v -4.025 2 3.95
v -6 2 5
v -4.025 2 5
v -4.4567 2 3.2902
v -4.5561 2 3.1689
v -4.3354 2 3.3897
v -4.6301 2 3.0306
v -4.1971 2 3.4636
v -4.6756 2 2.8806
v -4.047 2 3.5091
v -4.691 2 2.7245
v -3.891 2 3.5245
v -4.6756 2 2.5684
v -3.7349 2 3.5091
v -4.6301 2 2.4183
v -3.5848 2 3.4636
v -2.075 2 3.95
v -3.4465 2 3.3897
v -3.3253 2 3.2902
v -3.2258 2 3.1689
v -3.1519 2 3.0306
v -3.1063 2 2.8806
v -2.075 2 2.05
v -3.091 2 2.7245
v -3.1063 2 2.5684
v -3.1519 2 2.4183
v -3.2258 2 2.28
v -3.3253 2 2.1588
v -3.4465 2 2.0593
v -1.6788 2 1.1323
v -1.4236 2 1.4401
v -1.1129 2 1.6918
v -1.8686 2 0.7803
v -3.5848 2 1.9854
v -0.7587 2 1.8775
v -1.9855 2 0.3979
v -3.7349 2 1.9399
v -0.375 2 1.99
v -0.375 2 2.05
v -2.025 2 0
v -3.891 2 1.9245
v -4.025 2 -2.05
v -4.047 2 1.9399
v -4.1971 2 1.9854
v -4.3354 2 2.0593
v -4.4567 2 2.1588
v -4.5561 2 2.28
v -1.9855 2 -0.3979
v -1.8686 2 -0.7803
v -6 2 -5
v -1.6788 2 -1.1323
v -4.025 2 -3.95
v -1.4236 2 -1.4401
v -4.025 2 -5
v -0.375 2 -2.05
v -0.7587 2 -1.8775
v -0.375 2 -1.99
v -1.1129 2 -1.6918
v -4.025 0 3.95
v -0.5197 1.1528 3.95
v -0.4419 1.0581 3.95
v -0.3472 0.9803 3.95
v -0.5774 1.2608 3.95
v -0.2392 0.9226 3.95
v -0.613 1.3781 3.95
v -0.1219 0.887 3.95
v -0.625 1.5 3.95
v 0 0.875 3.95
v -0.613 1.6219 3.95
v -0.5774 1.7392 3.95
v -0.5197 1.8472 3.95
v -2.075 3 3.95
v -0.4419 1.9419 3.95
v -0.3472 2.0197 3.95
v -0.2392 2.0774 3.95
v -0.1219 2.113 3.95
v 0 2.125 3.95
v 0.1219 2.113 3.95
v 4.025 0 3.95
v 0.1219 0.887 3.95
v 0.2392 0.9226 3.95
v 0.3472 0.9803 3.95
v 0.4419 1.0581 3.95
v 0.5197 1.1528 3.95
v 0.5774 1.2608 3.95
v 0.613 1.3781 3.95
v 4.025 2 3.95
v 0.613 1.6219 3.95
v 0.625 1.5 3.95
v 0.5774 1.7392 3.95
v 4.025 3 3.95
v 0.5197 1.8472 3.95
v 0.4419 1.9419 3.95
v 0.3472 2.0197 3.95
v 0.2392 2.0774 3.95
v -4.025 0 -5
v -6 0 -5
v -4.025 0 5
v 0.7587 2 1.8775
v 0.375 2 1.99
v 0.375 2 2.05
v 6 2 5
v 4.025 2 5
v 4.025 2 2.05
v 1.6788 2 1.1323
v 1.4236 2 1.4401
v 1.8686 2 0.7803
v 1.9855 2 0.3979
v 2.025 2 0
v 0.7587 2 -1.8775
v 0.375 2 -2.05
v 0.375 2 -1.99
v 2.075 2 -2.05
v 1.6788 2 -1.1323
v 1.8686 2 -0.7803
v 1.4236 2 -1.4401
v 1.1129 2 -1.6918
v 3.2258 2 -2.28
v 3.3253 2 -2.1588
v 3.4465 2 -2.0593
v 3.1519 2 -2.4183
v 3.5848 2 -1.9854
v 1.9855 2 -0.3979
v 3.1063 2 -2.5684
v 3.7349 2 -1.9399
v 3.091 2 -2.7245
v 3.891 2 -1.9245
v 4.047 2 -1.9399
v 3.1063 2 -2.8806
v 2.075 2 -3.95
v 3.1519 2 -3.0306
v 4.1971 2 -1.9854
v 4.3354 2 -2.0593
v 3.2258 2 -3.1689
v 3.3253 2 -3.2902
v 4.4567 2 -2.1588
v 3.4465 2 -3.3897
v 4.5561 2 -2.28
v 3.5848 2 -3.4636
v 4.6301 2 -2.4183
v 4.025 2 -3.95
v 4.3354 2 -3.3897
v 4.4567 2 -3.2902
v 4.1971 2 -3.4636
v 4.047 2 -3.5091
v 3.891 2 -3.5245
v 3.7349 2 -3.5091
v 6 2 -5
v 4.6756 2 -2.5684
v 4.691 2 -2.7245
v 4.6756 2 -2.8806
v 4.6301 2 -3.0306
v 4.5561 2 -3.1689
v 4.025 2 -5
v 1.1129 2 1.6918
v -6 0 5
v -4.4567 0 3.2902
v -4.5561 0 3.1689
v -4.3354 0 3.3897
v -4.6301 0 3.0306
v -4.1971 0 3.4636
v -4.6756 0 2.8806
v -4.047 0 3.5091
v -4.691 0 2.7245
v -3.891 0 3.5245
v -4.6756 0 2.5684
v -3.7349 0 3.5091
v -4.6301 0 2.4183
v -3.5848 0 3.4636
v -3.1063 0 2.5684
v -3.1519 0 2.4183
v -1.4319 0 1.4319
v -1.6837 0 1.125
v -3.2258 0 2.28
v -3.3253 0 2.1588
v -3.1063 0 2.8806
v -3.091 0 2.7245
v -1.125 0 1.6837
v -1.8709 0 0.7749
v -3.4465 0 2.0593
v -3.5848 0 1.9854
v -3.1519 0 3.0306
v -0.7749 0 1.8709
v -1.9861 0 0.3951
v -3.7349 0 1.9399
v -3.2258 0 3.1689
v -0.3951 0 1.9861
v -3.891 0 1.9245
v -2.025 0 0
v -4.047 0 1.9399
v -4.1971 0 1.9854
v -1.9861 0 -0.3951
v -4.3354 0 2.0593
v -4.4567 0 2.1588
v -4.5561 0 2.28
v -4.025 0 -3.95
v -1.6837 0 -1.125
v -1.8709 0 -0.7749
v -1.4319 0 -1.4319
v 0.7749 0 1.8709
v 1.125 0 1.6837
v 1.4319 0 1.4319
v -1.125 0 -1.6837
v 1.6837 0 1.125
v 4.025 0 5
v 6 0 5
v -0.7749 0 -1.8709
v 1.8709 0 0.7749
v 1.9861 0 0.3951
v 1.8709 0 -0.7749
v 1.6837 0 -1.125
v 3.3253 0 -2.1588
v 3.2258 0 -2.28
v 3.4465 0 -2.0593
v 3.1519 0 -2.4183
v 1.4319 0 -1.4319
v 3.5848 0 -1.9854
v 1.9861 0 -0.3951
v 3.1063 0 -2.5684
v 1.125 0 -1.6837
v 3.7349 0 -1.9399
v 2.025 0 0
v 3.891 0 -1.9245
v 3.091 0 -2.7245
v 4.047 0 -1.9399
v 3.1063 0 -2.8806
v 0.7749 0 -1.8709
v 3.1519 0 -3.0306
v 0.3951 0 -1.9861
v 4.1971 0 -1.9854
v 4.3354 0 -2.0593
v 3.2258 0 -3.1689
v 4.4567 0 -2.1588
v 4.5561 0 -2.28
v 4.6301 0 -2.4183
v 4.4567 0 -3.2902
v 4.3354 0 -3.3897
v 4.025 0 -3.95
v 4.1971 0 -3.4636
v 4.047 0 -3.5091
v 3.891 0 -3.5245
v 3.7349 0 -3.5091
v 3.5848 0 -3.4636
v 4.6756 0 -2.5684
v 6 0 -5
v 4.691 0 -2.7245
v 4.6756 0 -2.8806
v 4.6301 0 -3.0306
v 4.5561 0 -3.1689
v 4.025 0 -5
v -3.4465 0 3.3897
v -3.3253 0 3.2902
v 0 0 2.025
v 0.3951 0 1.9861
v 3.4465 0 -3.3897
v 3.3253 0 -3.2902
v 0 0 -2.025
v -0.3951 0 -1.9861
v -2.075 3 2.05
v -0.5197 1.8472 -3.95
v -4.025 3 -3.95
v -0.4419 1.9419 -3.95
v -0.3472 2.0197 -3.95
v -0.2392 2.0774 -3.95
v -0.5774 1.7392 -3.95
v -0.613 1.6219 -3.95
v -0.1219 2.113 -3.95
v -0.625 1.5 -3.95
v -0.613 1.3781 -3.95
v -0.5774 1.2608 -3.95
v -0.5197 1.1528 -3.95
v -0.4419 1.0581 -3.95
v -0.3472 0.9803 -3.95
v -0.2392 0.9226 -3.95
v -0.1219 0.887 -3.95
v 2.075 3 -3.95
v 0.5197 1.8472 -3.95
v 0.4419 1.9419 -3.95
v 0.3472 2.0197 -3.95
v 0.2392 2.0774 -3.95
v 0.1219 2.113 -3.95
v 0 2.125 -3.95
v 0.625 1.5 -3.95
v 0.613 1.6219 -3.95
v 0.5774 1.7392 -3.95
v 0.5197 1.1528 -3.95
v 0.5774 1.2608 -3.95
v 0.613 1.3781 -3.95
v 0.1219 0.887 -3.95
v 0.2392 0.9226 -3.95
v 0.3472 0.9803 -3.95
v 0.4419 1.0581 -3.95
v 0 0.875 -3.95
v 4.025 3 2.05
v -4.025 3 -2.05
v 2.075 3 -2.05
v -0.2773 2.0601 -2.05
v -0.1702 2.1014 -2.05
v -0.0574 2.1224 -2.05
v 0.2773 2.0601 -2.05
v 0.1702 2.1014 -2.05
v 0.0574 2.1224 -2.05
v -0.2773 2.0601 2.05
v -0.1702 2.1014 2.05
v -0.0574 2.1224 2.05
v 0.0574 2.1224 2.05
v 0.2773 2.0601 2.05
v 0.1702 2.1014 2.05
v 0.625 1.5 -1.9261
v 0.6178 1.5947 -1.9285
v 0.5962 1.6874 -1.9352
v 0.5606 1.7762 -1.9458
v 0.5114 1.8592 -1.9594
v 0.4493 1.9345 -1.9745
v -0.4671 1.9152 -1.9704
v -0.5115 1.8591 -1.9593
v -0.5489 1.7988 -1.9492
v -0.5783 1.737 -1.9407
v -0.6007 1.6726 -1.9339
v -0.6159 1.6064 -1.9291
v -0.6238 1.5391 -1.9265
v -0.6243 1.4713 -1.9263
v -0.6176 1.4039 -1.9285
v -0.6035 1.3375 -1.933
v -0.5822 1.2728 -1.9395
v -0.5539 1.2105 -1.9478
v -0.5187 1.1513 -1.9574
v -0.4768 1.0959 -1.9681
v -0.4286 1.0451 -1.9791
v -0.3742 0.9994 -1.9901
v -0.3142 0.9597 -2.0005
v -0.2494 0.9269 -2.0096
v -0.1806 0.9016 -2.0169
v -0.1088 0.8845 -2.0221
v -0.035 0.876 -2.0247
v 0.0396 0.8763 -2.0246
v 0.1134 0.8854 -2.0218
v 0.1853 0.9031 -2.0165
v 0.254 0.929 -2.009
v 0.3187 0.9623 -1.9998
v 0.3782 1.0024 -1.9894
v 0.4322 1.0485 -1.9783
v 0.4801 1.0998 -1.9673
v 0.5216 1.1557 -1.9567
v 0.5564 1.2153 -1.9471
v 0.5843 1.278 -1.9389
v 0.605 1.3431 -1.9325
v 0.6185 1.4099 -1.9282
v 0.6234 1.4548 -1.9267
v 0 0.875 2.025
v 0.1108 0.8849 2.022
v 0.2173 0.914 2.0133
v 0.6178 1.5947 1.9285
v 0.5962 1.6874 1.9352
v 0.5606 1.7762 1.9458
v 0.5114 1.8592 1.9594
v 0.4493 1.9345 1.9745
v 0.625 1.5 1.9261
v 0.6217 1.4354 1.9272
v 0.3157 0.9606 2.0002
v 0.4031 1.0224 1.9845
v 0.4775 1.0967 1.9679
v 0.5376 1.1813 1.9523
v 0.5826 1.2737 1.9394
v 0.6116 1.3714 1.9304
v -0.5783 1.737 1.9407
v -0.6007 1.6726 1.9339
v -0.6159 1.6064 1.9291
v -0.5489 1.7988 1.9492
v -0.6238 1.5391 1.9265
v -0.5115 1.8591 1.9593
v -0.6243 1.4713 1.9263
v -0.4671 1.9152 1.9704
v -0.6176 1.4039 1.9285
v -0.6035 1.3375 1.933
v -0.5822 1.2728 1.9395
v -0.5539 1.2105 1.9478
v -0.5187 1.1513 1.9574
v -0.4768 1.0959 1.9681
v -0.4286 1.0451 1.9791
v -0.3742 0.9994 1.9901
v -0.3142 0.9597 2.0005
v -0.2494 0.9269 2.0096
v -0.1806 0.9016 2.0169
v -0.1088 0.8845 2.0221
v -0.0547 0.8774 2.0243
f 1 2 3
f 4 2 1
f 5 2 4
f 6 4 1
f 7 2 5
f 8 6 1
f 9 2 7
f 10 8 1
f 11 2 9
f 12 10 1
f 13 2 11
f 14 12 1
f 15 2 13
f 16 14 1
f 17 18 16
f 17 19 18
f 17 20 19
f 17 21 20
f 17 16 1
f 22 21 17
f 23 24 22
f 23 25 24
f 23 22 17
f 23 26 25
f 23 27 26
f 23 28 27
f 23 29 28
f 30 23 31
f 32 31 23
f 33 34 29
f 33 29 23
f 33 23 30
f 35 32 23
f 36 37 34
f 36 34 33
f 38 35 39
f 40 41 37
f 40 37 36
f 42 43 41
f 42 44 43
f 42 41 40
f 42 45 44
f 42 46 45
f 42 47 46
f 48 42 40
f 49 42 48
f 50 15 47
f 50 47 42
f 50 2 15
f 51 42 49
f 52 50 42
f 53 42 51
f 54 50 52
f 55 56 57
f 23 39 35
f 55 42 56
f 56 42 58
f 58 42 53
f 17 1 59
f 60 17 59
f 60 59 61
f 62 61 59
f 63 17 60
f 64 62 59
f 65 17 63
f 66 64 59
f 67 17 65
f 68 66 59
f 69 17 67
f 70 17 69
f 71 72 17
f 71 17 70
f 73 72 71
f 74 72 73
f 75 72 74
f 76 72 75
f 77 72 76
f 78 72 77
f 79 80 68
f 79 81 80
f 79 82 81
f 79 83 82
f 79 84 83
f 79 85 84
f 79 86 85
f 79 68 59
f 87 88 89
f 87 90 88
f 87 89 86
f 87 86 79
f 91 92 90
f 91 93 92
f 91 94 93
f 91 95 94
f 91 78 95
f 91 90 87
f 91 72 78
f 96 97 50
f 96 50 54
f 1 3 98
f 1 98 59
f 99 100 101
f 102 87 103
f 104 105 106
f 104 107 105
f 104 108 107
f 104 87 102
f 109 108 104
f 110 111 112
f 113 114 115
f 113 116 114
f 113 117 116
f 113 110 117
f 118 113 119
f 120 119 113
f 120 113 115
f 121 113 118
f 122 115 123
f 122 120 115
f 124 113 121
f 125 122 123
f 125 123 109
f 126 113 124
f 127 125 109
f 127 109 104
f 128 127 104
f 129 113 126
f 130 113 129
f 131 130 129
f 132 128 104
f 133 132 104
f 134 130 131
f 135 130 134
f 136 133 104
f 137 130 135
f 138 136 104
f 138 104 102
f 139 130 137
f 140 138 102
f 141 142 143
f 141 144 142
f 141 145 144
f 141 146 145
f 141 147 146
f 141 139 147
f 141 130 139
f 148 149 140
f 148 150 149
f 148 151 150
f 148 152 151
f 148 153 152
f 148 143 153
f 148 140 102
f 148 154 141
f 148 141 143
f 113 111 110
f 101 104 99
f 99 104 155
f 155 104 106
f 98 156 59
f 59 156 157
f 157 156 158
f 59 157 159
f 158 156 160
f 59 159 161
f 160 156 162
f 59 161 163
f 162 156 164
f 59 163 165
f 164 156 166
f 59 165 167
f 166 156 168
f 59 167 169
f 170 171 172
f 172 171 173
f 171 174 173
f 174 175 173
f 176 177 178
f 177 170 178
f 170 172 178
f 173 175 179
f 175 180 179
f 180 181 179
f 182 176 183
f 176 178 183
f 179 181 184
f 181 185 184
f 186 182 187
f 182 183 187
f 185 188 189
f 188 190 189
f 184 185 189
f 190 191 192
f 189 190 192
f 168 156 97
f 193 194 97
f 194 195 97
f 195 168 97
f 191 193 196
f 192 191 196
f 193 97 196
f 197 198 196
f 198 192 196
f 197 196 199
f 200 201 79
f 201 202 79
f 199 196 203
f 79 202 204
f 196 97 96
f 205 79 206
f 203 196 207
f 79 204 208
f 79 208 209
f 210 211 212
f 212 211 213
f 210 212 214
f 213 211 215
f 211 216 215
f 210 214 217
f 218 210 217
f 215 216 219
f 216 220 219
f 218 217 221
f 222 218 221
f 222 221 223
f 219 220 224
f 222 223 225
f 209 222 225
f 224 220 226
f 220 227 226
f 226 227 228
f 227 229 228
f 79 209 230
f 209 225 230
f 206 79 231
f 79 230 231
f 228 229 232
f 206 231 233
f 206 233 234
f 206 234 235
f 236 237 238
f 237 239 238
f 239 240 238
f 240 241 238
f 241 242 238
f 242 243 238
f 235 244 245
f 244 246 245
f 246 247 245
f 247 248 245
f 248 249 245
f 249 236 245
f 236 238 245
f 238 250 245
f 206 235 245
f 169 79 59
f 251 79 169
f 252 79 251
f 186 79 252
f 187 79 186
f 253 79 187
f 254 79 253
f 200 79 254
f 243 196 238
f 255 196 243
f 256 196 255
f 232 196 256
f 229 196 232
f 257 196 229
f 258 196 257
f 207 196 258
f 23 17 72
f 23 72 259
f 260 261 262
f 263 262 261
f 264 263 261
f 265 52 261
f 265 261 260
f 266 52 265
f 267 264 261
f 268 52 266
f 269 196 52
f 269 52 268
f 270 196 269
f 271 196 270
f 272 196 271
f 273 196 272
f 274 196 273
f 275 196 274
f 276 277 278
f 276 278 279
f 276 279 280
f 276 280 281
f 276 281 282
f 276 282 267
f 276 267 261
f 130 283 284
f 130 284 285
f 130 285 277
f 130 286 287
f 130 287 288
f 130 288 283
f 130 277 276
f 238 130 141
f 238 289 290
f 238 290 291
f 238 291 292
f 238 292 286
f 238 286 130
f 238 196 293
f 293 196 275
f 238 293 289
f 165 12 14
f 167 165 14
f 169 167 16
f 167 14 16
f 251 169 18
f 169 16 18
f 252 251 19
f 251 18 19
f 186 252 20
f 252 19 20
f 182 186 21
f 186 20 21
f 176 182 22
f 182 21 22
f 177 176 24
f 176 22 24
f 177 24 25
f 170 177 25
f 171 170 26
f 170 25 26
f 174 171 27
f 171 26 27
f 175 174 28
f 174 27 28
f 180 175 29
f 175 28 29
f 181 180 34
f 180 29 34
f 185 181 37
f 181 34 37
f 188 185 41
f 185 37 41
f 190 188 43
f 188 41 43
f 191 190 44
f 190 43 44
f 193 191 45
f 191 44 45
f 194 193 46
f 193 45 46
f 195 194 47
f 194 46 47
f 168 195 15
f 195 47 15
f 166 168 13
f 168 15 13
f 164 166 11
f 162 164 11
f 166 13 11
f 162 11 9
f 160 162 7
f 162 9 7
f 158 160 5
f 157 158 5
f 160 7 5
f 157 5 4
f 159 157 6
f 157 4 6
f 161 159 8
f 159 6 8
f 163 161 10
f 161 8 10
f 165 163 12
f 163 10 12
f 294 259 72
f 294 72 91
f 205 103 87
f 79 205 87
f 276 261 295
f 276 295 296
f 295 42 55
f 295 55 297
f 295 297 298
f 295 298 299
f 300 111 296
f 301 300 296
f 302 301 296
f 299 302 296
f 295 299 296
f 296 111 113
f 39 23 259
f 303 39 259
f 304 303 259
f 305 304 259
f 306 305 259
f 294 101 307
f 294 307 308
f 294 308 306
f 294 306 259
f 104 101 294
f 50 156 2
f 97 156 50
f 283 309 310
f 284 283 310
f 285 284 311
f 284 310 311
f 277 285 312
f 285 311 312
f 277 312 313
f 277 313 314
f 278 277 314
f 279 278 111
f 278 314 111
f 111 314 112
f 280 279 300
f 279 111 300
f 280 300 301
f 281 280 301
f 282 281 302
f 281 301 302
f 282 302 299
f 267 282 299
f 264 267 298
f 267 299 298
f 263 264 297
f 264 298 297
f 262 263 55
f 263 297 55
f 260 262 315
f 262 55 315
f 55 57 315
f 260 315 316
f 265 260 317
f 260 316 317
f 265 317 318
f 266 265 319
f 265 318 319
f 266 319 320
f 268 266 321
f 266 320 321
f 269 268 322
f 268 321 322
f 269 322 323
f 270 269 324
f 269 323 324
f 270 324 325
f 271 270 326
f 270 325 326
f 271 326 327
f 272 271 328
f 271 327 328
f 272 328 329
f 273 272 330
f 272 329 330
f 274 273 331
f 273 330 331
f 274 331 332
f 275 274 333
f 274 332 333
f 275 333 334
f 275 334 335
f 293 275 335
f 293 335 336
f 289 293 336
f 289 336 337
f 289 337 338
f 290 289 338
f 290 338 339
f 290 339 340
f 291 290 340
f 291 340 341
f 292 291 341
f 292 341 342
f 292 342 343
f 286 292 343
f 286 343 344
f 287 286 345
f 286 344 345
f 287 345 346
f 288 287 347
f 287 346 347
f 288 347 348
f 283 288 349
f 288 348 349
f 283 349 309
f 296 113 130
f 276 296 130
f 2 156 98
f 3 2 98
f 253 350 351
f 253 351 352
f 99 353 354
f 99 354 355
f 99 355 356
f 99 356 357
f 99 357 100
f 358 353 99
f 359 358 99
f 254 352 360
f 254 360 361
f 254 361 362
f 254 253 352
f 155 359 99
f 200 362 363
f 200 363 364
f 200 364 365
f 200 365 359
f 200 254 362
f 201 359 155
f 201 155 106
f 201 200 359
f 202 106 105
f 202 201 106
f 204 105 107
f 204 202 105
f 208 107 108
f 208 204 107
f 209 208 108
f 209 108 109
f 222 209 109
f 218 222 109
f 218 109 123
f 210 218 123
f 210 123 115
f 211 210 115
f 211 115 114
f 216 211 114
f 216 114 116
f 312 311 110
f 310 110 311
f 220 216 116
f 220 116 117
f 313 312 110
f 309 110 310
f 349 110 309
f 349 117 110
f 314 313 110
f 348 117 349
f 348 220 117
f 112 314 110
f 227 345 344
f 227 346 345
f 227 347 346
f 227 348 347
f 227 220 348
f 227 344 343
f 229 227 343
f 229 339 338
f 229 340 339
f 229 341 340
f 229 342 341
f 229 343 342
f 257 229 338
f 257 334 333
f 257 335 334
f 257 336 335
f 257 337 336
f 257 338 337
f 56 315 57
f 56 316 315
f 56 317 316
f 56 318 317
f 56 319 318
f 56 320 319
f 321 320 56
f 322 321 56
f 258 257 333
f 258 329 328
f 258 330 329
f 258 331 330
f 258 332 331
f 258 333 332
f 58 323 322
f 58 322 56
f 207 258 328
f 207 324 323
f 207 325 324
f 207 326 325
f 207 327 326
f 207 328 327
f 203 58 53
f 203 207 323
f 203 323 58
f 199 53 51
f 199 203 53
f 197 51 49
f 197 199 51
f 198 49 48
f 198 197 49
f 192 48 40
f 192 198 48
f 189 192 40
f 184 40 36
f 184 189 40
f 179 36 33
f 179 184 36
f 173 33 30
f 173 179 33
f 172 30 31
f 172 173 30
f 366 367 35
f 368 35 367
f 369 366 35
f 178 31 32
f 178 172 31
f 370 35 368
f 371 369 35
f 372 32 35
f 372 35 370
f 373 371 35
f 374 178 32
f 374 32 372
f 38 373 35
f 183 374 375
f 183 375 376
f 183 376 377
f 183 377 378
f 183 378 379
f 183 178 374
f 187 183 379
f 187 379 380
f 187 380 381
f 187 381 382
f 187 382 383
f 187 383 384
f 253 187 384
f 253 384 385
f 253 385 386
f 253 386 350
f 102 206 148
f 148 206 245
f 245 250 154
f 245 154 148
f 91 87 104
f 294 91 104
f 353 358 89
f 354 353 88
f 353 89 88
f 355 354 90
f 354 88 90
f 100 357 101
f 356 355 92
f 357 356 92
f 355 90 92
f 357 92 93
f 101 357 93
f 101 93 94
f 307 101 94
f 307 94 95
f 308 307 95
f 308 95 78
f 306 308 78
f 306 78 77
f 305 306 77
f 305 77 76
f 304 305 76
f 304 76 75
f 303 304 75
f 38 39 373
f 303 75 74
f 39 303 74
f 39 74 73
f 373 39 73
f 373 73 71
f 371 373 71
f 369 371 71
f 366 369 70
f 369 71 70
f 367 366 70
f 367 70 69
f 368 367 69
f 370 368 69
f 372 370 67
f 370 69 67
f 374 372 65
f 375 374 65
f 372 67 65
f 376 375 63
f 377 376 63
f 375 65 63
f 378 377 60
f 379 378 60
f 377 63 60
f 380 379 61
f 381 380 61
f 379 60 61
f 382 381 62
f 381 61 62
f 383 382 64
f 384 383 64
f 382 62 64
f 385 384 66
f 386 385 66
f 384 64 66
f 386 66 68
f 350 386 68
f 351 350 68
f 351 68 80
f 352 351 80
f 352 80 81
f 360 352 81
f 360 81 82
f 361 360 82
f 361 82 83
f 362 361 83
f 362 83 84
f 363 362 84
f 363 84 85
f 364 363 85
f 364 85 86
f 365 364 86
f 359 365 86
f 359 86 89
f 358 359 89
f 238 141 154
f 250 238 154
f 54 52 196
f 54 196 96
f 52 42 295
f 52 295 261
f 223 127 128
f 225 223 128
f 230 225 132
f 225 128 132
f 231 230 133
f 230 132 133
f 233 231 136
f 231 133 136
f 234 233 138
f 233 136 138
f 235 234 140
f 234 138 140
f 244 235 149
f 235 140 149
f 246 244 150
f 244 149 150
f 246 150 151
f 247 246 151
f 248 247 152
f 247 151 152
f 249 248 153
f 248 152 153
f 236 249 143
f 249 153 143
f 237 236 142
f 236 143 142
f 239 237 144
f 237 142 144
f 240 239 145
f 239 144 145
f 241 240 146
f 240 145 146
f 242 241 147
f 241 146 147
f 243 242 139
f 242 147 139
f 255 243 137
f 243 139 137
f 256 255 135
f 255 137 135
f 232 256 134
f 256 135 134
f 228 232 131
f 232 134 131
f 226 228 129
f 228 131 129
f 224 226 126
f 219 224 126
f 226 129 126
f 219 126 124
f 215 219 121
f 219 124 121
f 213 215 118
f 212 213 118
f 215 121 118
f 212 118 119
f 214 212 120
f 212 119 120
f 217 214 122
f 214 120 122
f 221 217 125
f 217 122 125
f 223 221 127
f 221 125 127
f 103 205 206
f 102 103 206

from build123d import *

# Parameters (mm, degrees)
SKETCH1_W                = 12
SKETCH1_H                = 10
SKETCH1_R                = 2.025
BOSS_EXTRUDE1_DEPTH      = 2
SKETCH2_R                = 0.8
SKETCH2_W                = 8.05
SKETCH2_H                = 1.05
CUT_EXTRUDE1_DEPTH       = 2
SKETCH3_W                = 6.1
SKETCH3_H                = 1.9
BOSS_EXTRUDE2_DEPTH      = 1
M1_6_TAPPED_HOLE1_REACH  = 13.185
M1_6_TAPPED_HOLE1_BORE_R = 0.625
M1_6_TAPPED_HOLE2_D      = 1.25


with BuildPart() as part:
    # Sketch1 → Boss-Extrude1 (new body)
    with BuildSketch(Plane(origin=(0, 0, 0), x_dir=(1, 0, 0), z_dir=(0, 1, 0))):
        Rectangle(SKETCH1_W, SKETCH1_H)
        with Locations(Location((0, 0, 0), (0, 0, 270))):
            Circle(SKETCH1_R, mode=Mode.SUBTRACT)
    extrude(amount=BOSS_EXTRUDE1_DEPTH)

    # Sketch2 → Cut-Extrude1 (cut)
    with BuildSketch(Plane(origin=(0, 2, 0), x_dir=(1, 0, 0), z_dir=(0, 1, 0))):
        with Locations(Location((3.89097221, 2.724488073, 0), (0, 0, 270))):
            Circle(SKETCH2_R)
        with Locations(Location((-3.89097221, -2.724488073, 0), (0, 0, 270))):
            Circle(SKETCH2_R)
        with Locations((0, 4.475)):
            Rectangle(SKETCH2_W, SKETCH2_H)
        with Locations((0, -4.475)):
            Rectangle(SKETCH2_W, SKETCH2_H)
    extrude(amount=-CUT_EXTRUDE1_DEPTH, mode=Mode.SUBTRACT)

    # Sketch3 → Boss-Extrude2 (add)
    with BuildSketch(Plane(origin=(0, 2, 0), x_dir=(1, 0, 0), z_dir=(0, 1, 0))):
        with Locations((-0.975, 3)):
            Rectangle(SKETCH3_W, SKETCH3_H)
        with Locations((0.975, -3)):
            Rectangle(SKETCH3_W, SKETCH3_H)
    extrude(amount=BOSS_EXTRUDE2_DEPTH)

    # M1.6 Tapped Hole1 bore → M1.6 Tapped Hole1 (cut, up to next)
    with BuildSketch(Plane.XY.offset(3.95), mode=Mode.PRIVATE) as m1_6_tapped_hole1_sk1:
        with Locations((0, 1.5)):
            Circle(M1_6_TAPPED_HOLE1_BORE_R)
    m1_6_tapped_hole1_tool1 = extrude(m1_6_tapped_hole1_sk1.sketch, amount=-M1_6_TAPPED_HOLE1_REACH, mode=Mode.PRIVATE) & part.part
    add(m1_6_tapped_hole1_tool1.solids().sort_by_distance((0, 1.5, 3.95))[0], mode=Mode.SUBTRACT)

    # M1.6 Tapped Hole2 (through all)
    with Locations(Plane(origin=(0, 0, -3.95), x_dir=(-1, 0, 0), z_dir=(0, 0, -1))):
        with Locations((0, 1.5)):
            Hole(M1_6_TAPPED_HOLE2_D / 2)


solid = part.part
